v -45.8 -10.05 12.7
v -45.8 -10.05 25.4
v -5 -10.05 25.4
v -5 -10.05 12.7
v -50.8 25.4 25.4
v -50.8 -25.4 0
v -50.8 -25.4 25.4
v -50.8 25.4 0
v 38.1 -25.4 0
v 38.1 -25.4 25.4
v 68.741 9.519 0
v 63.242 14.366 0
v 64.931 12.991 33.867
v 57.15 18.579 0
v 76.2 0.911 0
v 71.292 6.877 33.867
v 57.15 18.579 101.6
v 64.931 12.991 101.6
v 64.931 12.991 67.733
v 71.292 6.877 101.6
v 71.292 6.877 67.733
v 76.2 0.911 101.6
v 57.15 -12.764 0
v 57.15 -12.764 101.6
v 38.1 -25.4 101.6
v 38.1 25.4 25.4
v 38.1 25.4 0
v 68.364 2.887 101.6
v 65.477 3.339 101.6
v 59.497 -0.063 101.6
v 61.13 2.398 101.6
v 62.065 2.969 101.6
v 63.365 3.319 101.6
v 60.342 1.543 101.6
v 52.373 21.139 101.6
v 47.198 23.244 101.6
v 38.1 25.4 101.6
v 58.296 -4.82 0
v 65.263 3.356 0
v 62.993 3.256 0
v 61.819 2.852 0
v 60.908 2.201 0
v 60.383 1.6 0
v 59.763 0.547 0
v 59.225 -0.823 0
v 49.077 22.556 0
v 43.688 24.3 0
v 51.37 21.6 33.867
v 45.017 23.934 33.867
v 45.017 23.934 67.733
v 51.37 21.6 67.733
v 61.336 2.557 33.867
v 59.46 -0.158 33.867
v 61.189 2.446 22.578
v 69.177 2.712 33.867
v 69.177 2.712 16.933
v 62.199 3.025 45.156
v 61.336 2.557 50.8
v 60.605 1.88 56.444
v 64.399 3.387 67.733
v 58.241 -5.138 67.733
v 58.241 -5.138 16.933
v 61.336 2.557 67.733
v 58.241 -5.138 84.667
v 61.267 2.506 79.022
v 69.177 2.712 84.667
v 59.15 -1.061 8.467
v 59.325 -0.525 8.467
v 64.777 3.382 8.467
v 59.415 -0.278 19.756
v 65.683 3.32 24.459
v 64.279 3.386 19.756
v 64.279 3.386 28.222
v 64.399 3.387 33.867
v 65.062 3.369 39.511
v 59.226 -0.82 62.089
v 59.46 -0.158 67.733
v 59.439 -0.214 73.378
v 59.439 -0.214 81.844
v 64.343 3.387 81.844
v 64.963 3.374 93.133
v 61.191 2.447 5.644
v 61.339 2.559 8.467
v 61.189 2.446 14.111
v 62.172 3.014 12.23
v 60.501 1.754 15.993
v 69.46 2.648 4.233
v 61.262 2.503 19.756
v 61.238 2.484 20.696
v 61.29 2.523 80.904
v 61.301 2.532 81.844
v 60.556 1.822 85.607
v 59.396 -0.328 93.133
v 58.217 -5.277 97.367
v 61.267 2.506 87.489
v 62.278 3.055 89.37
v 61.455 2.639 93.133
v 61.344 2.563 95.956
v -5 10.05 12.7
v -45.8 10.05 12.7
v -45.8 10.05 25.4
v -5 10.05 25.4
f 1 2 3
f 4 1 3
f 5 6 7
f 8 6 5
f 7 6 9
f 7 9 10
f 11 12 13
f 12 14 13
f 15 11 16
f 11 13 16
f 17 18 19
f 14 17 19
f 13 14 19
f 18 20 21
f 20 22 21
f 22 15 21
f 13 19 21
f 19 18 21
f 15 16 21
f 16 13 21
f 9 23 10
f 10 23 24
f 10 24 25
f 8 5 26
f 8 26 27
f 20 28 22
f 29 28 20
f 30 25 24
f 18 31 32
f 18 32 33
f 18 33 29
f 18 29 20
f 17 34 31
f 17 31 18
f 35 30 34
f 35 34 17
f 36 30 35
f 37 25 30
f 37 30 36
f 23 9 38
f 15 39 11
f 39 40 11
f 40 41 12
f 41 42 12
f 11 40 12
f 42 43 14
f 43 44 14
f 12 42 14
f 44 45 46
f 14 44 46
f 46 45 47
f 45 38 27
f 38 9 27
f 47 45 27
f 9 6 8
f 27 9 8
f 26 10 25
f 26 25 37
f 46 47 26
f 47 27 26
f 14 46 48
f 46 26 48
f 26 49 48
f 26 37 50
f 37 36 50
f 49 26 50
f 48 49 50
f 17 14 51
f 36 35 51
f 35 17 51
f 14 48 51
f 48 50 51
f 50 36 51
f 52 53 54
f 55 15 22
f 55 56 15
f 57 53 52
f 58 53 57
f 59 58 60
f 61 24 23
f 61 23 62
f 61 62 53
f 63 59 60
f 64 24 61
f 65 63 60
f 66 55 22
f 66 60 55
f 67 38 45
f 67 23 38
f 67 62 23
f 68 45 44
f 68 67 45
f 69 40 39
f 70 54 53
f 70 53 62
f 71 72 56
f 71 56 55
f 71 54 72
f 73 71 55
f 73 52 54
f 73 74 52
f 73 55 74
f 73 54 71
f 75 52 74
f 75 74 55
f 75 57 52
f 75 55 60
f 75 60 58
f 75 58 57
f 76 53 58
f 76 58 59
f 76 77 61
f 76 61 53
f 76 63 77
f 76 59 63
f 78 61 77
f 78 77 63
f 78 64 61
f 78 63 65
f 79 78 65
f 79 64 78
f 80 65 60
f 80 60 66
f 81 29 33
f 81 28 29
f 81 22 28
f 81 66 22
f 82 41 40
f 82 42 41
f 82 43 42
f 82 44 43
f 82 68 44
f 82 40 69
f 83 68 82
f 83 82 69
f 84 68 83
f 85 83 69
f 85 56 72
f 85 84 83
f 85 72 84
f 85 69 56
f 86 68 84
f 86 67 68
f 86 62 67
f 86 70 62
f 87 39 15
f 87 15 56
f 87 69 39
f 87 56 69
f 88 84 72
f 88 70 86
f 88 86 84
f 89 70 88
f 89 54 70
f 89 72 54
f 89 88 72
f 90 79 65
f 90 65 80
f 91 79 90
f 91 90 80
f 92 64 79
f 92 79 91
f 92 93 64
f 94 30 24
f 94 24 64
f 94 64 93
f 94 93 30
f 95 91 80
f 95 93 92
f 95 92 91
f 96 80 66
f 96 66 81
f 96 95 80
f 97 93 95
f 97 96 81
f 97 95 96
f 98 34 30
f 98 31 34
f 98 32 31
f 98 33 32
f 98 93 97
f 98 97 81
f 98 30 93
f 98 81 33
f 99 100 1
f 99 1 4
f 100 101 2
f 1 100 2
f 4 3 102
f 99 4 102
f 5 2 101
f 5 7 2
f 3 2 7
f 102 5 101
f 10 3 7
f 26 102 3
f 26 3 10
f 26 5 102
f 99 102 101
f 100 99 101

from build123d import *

# Parameters (mm, degrees)
F0_W      = 101.6
F0_H      = 50.8
F1_DEPTH  = 25.4
F3_DEPTH  = 12.7
F4_W      = 12.7
F4_H      = 50.8
F5_DEPTH  = 76.2
F6_DEPTH  = 25.4
F8_DEPTH  = 228.6
F10_DEPTH = 228.6
F12_DEPTH = 228.6


with BuildPart() as f1:
    # F0 (on Top) → F1 (new body)
    with BuildSketch(Plane.XY):
        Rectangle(F0_W, F0_H)
    extrude(amount=F1_DEPTH)

    # F2 (on face) → F3 (cut)
    with BuildSketch(Plane.XY.offset(25.4)):
        with BuildLine():
            Line((-22.7059231637, 2.6940768363), (-25.4, 0))
            Line((-25.4, 0), (-22.7059231637, -2.6940768363))
            ThreePointArc((-22.7059231637, -2.6940768363), (-21.8800189811, -1.4580238773), (-21.59, 0))
            ThreePointArc((-21.59, 0), (-21.8800189811, 1.4580238773), (-22.7059231637, 2.6940768363))
        make_face()
        with BuildLine():
            ThreePointArc((-22.7059231637, 2.6940768363), (-25.4, 3.81), (-28.0940768363, 2.6940768363))
            Line((-28.0940768363, 2.6940768363), (-25.4, 0))
            Line((-25.4, 0), (-22.7059231637, 2.6940768363))
        make_face()
        with BuildLine():
            Line((-25.4, 0), (-28.0940768363, 2.6940768363))
            ThreePointArc((-28.0940768363, 2.6940768363), (-29.21, 0), (-28.0940768363, -2.6940768363))
            Line((-28.0940768363, -2.6940768363), (-25.4, 0))
        make_face()
        with BuildLine():
            Line((-22.7059231637, -2.6940768363), (-25.4, 0))
            Line((-25.4, 0), (-28.0940768363, -2.6940768363))
            ThreePointArc((-28.0940768363, -2.6940768363), (-25.4, -3.81), (-22.7059231637, -2.6940768363))
        make_face()
        with BuildLine():
            Line((-5.0000027, 10.05000022), (-14.7721255415, 10.05000022))
            ThreePointArc((-14.7721255415, 10.05000022), (-11.8093784333, 5.4082552971), (-10.772825976, 0))
            ThreePointArc((-10.772825976, 0), (-11.8093784333, -5.4082552971), (-14.7721255415, -10.05000022))
            Line((-14.7721255415, -10.05000022), (-5.0000027, -10.05000022))
            Line((-5.0000027, -10.05000022), (-5.0000027, 10.05000022))
        make_face()
        with BuildLine():
            Line((-15.34999978, 10.05000022), (-35.45000022, 10.05000022))
            Line((-35.45000022, 10.05000022), (-28.0940768363, 2.6940768363))
            ThreePointArc((-28.0940768363, 2.6940768363), (-25.4, 3.81), (-22.7059231637, 2.6940768363))
            Line((-22.7059231637, 2.6940768363), (-15.34999978, 10.05000022))
        make_face()
        with BuildLine():
            Line((-28.0940768363, -2.6940768363), (-35.45000022, -10.05000022))
            Line((-35.45000022, -10.05000022), (-15.34999978, -10.05000022))
            Line((-15.34999978, -10.05000022), (-22.7059231637, -2.6940768363))
            ThreePointArc((-22.7059231637, -2.6940768363), (-25.4, -3.81), (-28.0940768363, -2.6940768363))
        make_face()
        with BuildLine():
            ThreePointArc((-36.0278744585, -10.05000022), (-40.027174024, 0), (-36.0278744585, 10.05000022))
            Line((-36.0278744585, 10.05000022), (-45.7999973, 10.05000022))
            Line((-45.7999973, 10.05000022), (-45.7999973, -10.05000022))
            Line((-45.7999973, -10.05000022), (-36.0278744585, -10.05000022))
        make_face()
        with BuildLine():
            Line((-14.7721255415, 10.05000022), (-15.34999978, 10.05000022))
            Line((-15.34999978, 10.05000022), (-22.7059231637, 2.6940768363))
            ThreePointArc((-22.7059231637, 2.6940768363), (-21.8800189811, 1.4580238773), (-21.59, 0))
            ThreePointArc((-21.59, 0), (-21.8800189811, -1.4580238773), (-22.7059231637, -2.6940768363))
            Line((-22.7059231637, -2.6940768363), (-15.34999978, -10.05000022))
            Line((-15.34999978, -10.05000022), (-14.7721255415, -10.05000022))
            ThreePointArc((-14.7721255415, -10.05000022), (-11.8093784333, -5.4082552971), (-10.772825976, 0))
            ThreePointArc((-10.772825976, 0), (-11.8093784333, 5.4082552971), (-14.7721255415, 10.05000022))
        make_face()
        with BuildLine():
            Line((-28.0940768363, 2.6940768363), (-35.45000022, 10.05000022))
            Line((-35.45000022, 10.05000022), (-36.0278744585, 10.05000022))
            ThreePointArc((-36.0278744585, 10.05000022), (-40.027174024, 0), (-36.0278744585, -10.05000022))
            Line((-36.0278744585, -10.05000022), (-35.45000022, -10.05000022))
            Line((-35.45000022, -10.05000022), (-28.0940768363, -2.6940768363))
            ThreePointArc((-28.0940768363, -2.6940768363), (-29.21, 0), (-28.0940768363, 2.6940768363))
        make_face()
    extrude(amount=-F3_DEPTH, mode=Mode.SUBTRACT)

    # F4 (on face) → F5 (join)
    with BuildSketch(Plane.XY.offset(25.4)):
        with Locations((44.45, 0)):
            Rectangle(F4_W, F4_H)
    extrude(amount=F5_DEPTH)

    # F6 (add): a face of the model
    f6_faces = [f1.faces().sort_by_distance(p)[0] for p in [
        (50.8, 0, 50.8),
    ]]
    extrude(f6_faces, amount=F6_DEPTH)

    # F7 (on face) → F8 (cut)
    with BuildSketch(Plane.XY.offset(101.6)):
        with BuildLine():
            Line((57.15, 25.4), (38.1, 25.4))
            add(Edge.make_bspline(
                [(38.1, 25.4), (45.2961309058, 24.4295362641), (51.659373316, 21.8816089912), (57.15, 18.5792745817)],
                knots=[0, 0, 0, 0, 8.5975400143, 8.5975400143, 8.5975400143, 8.5975400143], degree=3))
            Line((57.15, 18.5792745817), (57.15, 25.4))
        make_face()
        with BuildLine():
            Line((76.2, 25.4), (57.15, 25.4))
            Line((57.15, 25.4), (57.15, 18.5792745817))
            add(Edge.make_bspline(
                [(57.15, 18.5792745817), (65.6305263938, 13.4786666307), (72.0293207641, 6.57832777), (76.2, 0.9109777383)],
                knots=[8.5975400143, 8.5975400143, 8.5975400143, 8.5975400143, 21.8768374808, 21.8768374808, 21.8768374808, 21.8768374808], degree=3))
            Line((76.2, 0.9109777383), (76.2, 25.4))
        make_face()
    extrude(amount=-F8_DEPTH, mode=Mode.SUBTRACT)

    # F9 (on face) → F10 (cut)
    with BuildSketch(Plane.XY.offset(101.6)):
        Polygon((38.1, -25.4), (57.15, -25.4), (57.15, -12.7636595487), align=None)
    extrude(amount=-F10_DEPTH, mode=Mode.SUBTRACT)

    # F11 (on face) → F12 (cut)
    with BuildSketch(Plane.XY.offset(101.6)):
        with BuildLine():
            add(Edge.make_bspline(
                [(57.15, -12.7636595487), (59.5569387078, 5.385174416), (59.5569387078, 5.385174416), (76.2, 0.9109777382)],
                knots=[0, 0, 0, 0, 23.4499084205, 23.4499084205, 23.4499084205, 23.4499084205], degree=3))
            Line((57.15, -12.7636595487), (57.15, -25.4))
            Line((57.15, -25.4), (76.2, -25.4))
            Line((76.2, -25.4), (76.2, 0.9109777383))
        make_face()
    extrude(amount=-F12_DEPTH, mode=Mode.SUBTRACT)


solid = f1.part
